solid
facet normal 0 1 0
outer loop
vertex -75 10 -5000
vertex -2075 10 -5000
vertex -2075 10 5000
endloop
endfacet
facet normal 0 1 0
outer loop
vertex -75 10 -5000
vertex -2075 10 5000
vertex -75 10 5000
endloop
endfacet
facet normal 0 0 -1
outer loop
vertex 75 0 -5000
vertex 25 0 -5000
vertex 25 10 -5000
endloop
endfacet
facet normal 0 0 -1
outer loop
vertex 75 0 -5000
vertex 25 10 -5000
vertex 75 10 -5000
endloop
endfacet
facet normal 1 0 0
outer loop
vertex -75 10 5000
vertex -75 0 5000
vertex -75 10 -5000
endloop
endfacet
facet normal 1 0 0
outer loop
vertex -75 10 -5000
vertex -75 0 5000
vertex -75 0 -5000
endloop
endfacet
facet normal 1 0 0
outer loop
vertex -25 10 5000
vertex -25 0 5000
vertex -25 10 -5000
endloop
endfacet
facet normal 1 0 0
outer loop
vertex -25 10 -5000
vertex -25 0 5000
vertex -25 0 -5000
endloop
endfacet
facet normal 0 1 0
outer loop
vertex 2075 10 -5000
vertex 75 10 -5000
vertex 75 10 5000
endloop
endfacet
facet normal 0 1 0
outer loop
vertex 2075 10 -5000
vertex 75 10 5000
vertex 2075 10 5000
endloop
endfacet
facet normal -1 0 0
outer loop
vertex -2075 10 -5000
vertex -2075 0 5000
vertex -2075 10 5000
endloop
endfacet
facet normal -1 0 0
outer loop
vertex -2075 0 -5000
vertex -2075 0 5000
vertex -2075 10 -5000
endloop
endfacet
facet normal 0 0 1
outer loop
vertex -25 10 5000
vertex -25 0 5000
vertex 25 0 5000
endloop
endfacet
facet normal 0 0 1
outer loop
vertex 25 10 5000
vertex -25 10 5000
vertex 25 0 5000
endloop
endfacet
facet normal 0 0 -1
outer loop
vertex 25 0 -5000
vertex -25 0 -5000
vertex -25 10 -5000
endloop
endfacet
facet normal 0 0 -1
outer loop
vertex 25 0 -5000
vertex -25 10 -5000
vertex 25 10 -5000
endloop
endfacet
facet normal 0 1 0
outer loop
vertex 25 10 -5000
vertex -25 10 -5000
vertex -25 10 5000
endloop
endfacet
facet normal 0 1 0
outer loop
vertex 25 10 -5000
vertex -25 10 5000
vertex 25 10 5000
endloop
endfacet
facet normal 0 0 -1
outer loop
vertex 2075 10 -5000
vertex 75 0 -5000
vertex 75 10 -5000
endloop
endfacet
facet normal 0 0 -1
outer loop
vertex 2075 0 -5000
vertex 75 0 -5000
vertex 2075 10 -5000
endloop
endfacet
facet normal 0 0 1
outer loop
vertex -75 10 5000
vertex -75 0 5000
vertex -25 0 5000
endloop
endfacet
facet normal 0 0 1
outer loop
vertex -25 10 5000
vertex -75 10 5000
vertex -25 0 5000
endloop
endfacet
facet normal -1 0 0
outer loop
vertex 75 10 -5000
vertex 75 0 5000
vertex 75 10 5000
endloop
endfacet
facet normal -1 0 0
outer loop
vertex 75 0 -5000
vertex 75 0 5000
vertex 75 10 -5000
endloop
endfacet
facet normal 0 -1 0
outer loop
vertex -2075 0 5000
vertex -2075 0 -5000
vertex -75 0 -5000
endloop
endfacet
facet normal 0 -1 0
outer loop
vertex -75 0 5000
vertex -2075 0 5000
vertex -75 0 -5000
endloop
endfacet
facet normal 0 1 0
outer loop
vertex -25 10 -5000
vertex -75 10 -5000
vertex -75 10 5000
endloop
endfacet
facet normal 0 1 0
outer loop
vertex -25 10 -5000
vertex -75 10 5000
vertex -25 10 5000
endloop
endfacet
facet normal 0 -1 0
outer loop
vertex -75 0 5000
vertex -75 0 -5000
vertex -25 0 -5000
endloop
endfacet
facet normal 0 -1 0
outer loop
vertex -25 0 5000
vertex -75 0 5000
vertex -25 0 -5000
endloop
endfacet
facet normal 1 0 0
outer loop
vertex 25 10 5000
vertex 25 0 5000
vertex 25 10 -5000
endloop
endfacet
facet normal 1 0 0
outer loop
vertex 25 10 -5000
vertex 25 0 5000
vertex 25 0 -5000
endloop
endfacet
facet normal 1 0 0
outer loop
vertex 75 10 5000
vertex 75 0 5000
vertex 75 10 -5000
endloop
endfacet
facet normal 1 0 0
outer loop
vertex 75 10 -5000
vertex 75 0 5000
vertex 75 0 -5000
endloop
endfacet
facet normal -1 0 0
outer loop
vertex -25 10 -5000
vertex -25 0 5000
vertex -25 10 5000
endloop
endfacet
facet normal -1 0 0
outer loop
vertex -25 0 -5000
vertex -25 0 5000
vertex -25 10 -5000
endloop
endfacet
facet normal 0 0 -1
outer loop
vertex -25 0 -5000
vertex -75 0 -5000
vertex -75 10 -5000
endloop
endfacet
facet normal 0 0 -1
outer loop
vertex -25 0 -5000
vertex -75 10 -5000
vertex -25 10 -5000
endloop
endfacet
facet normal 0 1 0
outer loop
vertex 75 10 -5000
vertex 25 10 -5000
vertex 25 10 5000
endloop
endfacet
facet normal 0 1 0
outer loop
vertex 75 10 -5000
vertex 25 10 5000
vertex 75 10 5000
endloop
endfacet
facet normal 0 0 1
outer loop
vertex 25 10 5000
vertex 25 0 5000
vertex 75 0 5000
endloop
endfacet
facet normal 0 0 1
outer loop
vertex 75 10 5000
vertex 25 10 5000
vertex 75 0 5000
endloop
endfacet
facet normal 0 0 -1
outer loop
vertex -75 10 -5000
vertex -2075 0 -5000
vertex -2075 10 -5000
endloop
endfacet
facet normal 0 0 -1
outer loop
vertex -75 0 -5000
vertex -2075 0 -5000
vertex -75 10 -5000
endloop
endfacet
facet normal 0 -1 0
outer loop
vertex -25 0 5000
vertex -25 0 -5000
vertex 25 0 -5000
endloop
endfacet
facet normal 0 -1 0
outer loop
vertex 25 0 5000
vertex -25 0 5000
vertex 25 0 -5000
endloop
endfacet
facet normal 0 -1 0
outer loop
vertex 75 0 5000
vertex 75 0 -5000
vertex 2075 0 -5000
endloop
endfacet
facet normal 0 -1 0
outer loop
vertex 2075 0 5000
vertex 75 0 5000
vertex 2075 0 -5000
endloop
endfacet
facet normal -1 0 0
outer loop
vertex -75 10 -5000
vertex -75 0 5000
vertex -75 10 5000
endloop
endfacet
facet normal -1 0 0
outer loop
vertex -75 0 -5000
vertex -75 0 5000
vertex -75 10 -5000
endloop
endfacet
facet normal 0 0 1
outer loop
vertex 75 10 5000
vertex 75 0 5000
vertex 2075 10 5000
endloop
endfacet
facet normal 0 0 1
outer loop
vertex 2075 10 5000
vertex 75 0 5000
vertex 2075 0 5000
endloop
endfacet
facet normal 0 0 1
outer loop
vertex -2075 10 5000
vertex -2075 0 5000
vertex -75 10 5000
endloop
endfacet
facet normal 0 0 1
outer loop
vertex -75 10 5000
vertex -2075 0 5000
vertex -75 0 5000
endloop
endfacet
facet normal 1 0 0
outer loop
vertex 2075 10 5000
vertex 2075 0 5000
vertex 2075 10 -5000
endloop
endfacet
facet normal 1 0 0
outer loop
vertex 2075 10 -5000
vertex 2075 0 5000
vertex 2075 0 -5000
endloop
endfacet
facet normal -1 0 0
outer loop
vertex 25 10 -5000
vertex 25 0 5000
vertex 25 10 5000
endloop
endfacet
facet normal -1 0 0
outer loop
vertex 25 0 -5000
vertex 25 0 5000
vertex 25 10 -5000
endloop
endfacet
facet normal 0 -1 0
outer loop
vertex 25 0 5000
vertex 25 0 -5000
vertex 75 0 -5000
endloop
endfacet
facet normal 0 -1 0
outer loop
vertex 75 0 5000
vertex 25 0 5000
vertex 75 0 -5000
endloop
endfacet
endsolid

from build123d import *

# Parameters (mm, degrees)
ESQUISSE1_W          = 50
ESQUISSE1_H          = 10000
BOSS_EXTRU_2_DEPTH   = 10
ESQUISSE1_4_W        = 50
ESQUISSE1_4_H        = 10000
BOSS_EXTRU_3_DEPTH   = 10
BOSS_EXTRU_3_2_DEPTH = 10
ESQUISSE1_5_W        = 2000
ESQUISSE1_5_H        = 10000
BOSS_EXTRU_4_DEPTH   = 10
BOSS_EXTRU_4_2_DEPTH = 10


with BuildPart() as part:
    # Esquisse1 → Boss.-Extru.2 (new body)
    with BuildSketch(Plane(origin=(0, 0, 0), x_dir=(1, 0, 0), z_dir=(0, 1, 0))):
        Rectangle(ESQUISSE1_W, ESQUISSE1_H)
    extrude(amount=BOSS_EXTRU_2_DEPTH)


with BuildPart() as body_2:
    # Esquisse1<4> → Boss.-Extru.3 (new body)
    with BuildSketch(Plane(origin=(0, 0, 0), x_dir=(1, 0, 0), z_dir=(0, 1, 0))):
        with Locations((-50, 0)):
            Rectangle(ESQUISSE1_4_W, ESQUISSE1_4_H)
    extrude(amount=BOSS_EXTRU_3_DEPTH)


with BuildPart() as body_3:
    # Esquisse1<4> → Boss.-Extru.3 2 (new body)
    with BuildSketch(Plane(origin=(0, 0, 0), x_dir=(1, 0, 0), z_dir=(0, 1, 0))):
        with Locations((50, 0)):
            Rectangle(ESQUISSE1_4_W, ESQUISSE1_4_H)
    extrude(amount=BOSS_EXTRU_3_2_DEPTH)


with BuildPart() as body_4:
    # Esquisse1<5> → Boss.-Extru.4 (new body)
    with BuildSketch(Plane(origin=(0, 0, 0), x_dir=(1, 0, 0), z_dir=(0, 1, 0))):
        with Locations((-1075, 0)):
            Rectangle(ESQUISSE1_5_W, ESQUISSE1_5_H)
    extrude(amount=BOSS_EXTRU_4_DEPTH)


with BuildPart() as body_5:
    # Esquisse1<5> → Boss.-Extru.4 2 (new body)
    with BuildSketch(Plane(origin=(0, 0, 0), x_dir=(1, 0, 0), z_dir=(0, 1, 0))):
        with Locations((1075, 0)):
            Rectangle(ESQUISSE1_5_W, ESQUISSE1_5_H)
    extrude(amount=BOSS_EXTRU_4_2_DEPTH)


solid = Compound([part.part, body_2.part, body_3.part, body_4.part, body_5.part])
